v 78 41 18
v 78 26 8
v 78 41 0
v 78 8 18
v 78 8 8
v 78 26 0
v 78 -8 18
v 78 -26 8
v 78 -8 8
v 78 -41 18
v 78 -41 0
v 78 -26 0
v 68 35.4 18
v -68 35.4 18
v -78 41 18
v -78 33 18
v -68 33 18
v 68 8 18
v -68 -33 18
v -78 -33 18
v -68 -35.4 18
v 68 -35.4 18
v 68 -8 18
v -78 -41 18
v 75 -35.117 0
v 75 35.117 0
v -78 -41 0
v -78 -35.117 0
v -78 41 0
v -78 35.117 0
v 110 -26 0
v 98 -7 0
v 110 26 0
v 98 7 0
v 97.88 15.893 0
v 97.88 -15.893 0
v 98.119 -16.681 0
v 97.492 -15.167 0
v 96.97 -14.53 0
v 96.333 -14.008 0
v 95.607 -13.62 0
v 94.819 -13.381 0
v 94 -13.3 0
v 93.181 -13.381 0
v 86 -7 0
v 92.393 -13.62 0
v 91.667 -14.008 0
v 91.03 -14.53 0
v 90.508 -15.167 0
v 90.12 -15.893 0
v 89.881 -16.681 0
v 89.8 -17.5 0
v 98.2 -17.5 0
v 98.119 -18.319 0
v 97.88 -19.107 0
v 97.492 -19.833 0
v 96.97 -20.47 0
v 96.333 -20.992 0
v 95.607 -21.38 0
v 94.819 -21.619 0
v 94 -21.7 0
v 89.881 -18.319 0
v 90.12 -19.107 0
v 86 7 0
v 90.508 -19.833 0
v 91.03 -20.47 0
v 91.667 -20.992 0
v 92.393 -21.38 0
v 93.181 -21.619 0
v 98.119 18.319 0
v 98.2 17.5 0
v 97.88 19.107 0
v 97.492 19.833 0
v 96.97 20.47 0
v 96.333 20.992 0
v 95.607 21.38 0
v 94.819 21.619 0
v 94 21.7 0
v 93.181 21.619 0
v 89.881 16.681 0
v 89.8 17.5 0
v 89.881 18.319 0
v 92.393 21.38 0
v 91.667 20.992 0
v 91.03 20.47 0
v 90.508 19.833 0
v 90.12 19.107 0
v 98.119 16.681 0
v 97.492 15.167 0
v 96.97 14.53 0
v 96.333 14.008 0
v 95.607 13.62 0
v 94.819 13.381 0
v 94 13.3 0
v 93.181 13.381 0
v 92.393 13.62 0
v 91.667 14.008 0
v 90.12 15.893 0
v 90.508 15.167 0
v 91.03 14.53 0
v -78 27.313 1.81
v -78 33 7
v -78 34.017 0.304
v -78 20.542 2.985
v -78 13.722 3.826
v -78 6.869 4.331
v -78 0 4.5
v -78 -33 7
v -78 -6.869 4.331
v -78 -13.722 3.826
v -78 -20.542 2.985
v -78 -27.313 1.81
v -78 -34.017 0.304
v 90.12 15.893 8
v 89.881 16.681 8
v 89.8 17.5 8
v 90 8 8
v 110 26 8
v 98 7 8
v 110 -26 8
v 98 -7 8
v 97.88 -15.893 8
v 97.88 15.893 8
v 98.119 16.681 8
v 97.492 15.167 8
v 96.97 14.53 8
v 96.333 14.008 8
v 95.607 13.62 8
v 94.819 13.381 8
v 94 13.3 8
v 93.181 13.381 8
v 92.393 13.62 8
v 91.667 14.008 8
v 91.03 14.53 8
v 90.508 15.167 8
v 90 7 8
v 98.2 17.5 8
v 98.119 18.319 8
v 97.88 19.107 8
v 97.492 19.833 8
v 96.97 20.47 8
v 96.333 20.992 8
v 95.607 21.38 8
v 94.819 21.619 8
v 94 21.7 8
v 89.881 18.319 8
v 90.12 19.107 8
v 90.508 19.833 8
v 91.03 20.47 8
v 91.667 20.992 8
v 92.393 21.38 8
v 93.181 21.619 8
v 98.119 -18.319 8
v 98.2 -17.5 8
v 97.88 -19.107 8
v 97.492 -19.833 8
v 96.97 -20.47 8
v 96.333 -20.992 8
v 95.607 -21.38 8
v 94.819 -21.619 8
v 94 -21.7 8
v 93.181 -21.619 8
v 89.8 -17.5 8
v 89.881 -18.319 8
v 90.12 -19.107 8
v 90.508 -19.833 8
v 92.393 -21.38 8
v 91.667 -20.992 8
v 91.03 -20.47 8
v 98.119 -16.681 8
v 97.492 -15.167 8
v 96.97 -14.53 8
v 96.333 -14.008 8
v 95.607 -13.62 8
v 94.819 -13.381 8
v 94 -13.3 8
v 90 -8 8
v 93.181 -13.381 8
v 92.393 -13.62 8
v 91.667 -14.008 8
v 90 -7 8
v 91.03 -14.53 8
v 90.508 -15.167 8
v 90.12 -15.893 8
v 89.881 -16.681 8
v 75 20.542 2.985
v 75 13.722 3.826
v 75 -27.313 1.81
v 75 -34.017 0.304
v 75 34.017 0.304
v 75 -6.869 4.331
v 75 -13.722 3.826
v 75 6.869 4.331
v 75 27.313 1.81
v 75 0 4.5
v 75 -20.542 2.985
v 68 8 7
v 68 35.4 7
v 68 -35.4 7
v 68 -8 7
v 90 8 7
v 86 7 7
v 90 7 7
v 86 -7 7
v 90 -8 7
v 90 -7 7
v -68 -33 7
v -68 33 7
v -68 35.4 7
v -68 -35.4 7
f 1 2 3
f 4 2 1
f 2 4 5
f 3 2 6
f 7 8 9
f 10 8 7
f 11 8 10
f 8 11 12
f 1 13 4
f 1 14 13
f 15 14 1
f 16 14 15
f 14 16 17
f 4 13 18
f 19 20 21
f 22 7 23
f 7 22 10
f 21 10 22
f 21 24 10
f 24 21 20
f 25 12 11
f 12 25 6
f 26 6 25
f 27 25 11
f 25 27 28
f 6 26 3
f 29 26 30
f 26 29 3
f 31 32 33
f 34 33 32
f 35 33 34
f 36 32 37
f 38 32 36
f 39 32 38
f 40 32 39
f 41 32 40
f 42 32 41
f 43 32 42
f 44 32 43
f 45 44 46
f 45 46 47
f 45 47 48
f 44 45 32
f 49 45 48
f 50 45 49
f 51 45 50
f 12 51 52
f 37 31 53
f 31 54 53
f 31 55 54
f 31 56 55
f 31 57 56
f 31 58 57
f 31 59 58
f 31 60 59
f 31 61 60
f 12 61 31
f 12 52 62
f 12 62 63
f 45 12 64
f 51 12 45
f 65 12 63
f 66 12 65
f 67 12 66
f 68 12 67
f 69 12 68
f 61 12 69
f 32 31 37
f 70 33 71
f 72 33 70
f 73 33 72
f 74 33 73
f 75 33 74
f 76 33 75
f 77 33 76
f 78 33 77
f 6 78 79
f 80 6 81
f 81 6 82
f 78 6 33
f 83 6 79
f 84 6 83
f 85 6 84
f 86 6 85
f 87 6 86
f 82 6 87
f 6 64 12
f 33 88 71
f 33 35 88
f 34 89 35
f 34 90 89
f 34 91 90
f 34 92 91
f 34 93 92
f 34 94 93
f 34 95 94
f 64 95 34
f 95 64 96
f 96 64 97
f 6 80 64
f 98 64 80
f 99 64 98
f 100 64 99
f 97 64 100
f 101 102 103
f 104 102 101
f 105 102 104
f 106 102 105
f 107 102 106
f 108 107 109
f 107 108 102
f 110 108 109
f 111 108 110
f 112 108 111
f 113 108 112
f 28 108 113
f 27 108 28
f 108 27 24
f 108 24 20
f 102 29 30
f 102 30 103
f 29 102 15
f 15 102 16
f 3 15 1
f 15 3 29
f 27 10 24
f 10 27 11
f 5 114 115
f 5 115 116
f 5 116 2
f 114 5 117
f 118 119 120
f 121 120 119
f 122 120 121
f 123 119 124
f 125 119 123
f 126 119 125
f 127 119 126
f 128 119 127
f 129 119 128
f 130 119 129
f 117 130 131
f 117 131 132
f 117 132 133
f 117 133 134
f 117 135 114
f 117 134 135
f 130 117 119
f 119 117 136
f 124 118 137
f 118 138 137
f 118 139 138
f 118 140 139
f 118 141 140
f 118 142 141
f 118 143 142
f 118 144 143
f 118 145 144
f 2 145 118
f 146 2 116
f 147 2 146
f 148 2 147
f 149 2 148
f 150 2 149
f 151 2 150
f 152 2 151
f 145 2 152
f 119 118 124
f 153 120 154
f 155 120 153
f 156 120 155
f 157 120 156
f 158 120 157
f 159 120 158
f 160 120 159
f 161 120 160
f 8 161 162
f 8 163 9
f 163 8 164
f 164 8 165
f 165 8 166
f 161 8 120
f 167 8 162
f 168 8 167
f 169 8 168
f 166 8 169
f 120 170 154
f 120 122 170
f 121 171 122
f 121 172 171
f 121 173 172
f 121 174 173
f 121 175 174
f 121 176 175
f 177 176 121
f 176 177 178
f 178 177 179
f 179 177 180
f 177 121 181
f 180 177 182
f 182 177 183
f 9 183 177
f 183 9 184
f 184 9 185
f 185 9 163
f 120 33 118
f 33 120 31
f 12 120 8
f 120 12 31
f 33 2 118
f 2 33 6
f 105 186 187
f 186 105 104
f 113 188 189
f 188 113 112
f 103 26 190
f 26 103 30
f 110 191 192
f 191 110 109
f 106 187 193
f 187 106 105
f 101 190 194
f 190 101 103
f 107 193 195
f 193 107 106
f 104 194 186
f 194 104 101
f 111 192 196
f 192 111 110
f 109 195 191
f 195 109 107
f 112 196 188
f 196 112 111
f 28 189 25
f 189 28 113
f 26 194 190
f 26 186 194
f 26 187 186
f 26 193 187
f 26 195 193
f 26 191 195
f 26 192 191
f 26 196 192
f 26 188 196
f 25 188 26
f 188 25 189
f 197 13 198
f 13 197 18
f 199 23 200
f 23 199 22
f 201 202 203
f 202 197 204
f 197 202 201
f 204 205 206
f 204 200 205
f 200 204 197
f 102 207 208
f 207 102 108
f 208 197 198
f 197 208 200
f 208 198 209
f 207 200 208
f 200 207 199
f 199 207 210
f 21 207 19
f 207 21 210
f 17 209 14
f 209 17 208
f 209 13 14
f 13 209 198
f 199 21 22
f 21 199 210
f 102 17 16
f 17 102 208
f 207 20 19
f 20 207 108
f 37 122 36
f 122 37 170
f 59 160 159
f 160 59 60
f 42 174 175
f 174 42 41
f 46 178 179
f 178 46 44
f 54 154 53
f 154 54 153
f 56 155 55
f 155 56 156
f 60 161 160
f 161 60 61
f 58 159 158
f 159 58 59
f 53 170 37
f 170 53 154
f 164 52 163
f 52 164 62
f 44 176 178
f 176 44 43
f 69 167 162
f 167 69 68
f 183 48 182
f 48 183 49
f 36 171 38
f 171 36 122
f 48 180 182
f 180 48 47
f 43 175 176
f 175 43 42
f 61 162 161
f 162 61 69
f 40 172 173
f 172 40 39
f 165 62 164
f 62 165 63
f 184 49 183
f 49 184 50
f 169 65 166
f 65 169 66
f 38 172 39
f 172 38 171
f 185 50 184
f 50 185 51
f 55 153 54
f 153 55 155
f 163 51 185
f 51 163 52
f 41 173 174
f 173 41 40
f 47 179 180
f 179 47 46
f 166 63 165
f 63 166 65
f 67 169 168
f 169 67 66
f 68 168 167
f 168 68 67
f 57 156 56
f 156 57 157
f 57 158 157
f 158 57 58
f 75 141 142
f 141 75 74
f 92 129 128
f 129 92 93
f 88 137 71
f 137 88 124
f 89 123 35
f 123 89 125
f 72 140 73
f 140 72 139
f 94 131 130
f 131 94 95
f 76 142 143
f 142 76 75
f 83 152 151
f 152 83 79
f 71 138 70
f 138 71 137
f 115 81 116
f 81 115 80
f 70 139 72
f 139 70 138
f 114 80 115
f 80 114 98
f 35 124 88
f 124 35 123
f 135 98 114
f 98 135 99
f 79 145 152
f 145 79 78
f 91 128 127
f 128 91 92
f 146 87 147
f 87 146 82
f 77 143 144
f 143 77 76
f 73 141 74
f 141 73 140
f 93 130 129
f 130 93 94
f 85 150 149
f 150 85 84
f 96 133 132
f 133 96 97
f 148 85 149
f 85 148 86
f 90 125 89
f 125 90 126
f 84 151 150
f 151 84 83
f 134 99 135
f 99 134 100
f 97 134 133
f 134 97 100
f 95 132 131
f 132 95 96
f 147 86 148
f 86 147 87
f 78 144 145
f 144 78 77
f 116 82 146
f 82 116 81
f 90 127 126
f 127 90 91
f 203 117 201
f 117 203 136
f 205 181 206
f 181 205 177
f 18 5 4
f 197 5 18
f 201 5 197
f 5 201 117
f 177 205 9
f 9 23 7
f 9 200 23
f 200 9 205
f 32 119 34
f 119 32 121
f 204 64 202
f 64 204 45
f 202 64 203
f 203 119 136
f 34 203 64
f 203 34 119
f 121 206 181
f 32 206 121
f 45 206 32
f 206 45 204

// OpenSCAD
// file: ../../00_common/parameters.scad
// =============================================================================
// OpenMotorBridge - Global CAD Parameters & Settings
// =============================================================================
// File: hardware/cad/scad/00_common/parameters.scad
// Description: Global dimensional constants, manufacturing clearances and
//              circle resolution ($fn) for all OpenSCAD modules.
// =============================================================================

// --- 1. Circle & Curve Resolution ---
$fn = 60; // Smooth cylinders and holes for high-quality MJF 3D printing

// --- 2. Central Main Box Dimensions (3-Tier Sandwich) ---
MAIN_BOX_OUTER_L      = 110.0; // Outer length in X (mm)
MAIN_BOX_OUTER_W      = 74.0;  // Outer width in Y (mm)
MAIN_BOX_LOWER_H      = 17.0;  // Lower case height in Z (mm)
MAIN_BOX_MID_H        = 15.0;  // Mid tray height in Z (mm)
MAIN_BOX_LID_H        = 4.0;   // Lid plate thickness in Z (mm)
MAIN_BOX_WALL         = 2.5;   // Nominal wall thickness (mm)
MAIN_BOX_CORNER_POST  = 7.0;   // Corner clamping screw post size (mm, for M3 hex nut pockets)

// --- 3. Satellite Pod Dimensions (Universal Enlarged Envelope) ---
POD_OUTER_L           = 135.0; // Outer length in X (mm)
POD_OUTER_W           = 70.0;  // Outer width in Y (mm)
POD_OUTER_H           = 38.0;  // Outer height in Z (mm)
POD_WALL              = 3.5;   // Nominal wall thickness (mm)
POD_BULKHEAD_X        = 18.0;  // Partition bulkhead position in X (mm)
POD_CHAMBER_L         = 117.0; // Sliding chamber length in X (mm)
POD_CHAMBER_W         = 63.0;  // Sliding chamber width in Y (mm)
POD_CHAMBER_H         = 31.0;  // Sliding chamber height in Z (mm)

// --- 4. Pod Linear Guide Rails (Poka-Yoke Tongue & Groove) ---
POD_GROOVE_W          = 3.0;   // Internal guide groove width in Z (mm)
POD_GROOVE_DEPTH      = 1.5;   // Internal guide groove depth in Y (mm)
POD_GROOVE_LEFT_Z     = 10.0;  // Center height of left groove (mm)
POD_GROOVE_RIGHT_Z    = 18.0;  // Center height of right groove (mm, asym offset)

CARTRIDGE_TONGUE_W    = 2.6;   // Cartridge tongue rail height in Z (mm, 0.2mm clearance)
CARTRIDGE_TONGUE_PROT = 1.4;   // Cartridge tongue protrusion in Y (mm, 0.1mm clearance)
CARTRIDGE_CHAMFER_L   = 4.0;   // 30° lead-in chamfer nose length (mm)

// --- 5. Cartridge Dimensions (Enlarged Universal Sled) ---
CARTRIDGE_BASE_L      = 116.0; // Sled length in X (mm)
CARTRIDGE_BASE_W      = 58.0;  // Sled width in Y (mm)
CARTRIDGE_BASE_H      = 28.0;  // Sled height in Z (mm)
CARTRIDGE_FACE_L      = 4.0;   // Front faceplate thickness in X (mm)
CARTRIDGE_FACE_W      = 64.0;  // Front faceplate width in Y (mm)
CARTRIDGE_FACE_H      = 34.0;  // Front faceplate height in Z (mm)

// --- 5a. RF Interface & Sealing Dimensions ---
SMA_BORE_R            = 3.25;  // Ø 6.5 mm through-hole for standard SMA bulkhead
SMA_ORECESS_R         = 4.75;  // Ø 9.5 mm recess for waterproof silicone O-ring
SMA_ORECESS_DEPTH     = 1.2;   // 1.2 mm deep O-ring compression pocket

// --- 5b. Magnetic Anti-Theft Lock System ---
LATCH_PIVOT_X         = 58.0;  // Center pivot position along sled X (mm)
LATCH_MAGNET_X        = 46.0;  // Ferromagnetic anchor position along sled X (mm)
LATCH_TOOTH_X         = 70.0;  // Locking sawtooth pawl position along sled X (mm)
LATCH_ARM_H           = 6.0;   // Rocker lever height in Z (mm)
LATCH_ARM_THICK       = 2.6;   // Rocker beam thickness in Y (mm)
LATCH_MAGNET_PIN_DIA  = 6.2;   // Bore for Ø 6.0 mm steel dowel pin (mm)
LATCH_SPRING_DIA      = 3.8;   // Bore for Ø 3.5 mm return compression spring (mm)

// --- 6. Standard Captive Hex Nut Pockets (DIN 934 / DIN 985 with +0.2 mm MJF/FDM clearance) ---
NUT_M2_SW             = 4.2;   // M2 across flats (nominal 4.0 mm)
NUT_M2_H              = 1.8;   // M2 thickness (nominal 1.6 mm)
NUT_M2_5_SW           = 5.2;   // M2.5 across flats (nominal 5.0 mm)
NUT_M2_5_H            = 2.2;   // M2.5 thickness (nominal 2.0 mm)
NUT_M3_SW             = 5.7;   // M3 across flats (nominal 5.5 mm)
NUT_M3_H              = 2.6;   // M3 thickness (nominal 2.4 mm)
NUT_M4_SW             = 7.2;   // M4 across flats (nominal 7.0 mm)
NUT_M4_H              = 3.4;   // M4 thickness (nominal 3.2 mm)
NUT_M5_SW             = 8.2;   // M5 across flats (nominal 8.0 mm)
NUT_M5_H              = 4.2;   // M5 thickness (nominal 4.0 mm)

// Direct Plastic Thread-Forming / Self-Tapping Pilot Holes in PA12 (100% Soldering-Iron Free)
M2_PILOT_HOLE_R       = 0.85;  // Core hole for M2 screws in PA12 (Ø 1.7 mm)
M2_5_PILOT_HOLE_R     = 1.05;  // Core hole for M2.5 screws in PA12 (Ø 2.1 mm)
M3_PILOT_HOLE_R       = 1.25;  // Core hole for M3 screws in PA12 (Ø 2.5 mm)

// --- 7. Screw & Clearance Dimensions ---
M2_SCREW_HOLE_R       = 1.1;   // M2 clearance hole (r = 1.1 mm -> Ø 2.2 mm)
M2_5_SCREW_HOLE_R     = 1.4;   // M2.5 clearance hole (r = 1.4 mm -> Ø 2.8 mm)
M3_SCREW_HOLE_R       = 1.65;  // M3 clearance hole (r = 1.65 mm -> Ø 3.3 mm)
M4_SCREW_HOLE_R       = 2.2;   // M4 clearance hole (r = 2.2 mm -> Ø 4.4 mm)
M8_BORE_R             = 4.0;   // M8 cable through-bore (r = 4.0 mm -> Ø 8.0 mm)
M8_STUDS_OUTER_R      = 6.0;   // M8 neck outer radius (Ø 12.0 mm)

// --- 8. Universal Front Node Enclosure Dimensions (Type E: 98 x 68 x 25 mm) ---
FRONT_NODE_PCB_L      = 82.0;  // PCB length in X (mm, PCBA 05)
FRONT_NODE_PCB_W      = 50.0;  // PCB width in Y (mm, PCBA 05)
FRONT_NODE_PCB_H      = 1.6;   // PCB thickness in Z (mm)
FRONT_NODE_PCB_R      = 2.5;   // PCB corner radius (mm)

FRONT_NODE_CHAMBER_L  = 86.0;  // Internal chamber length in X (mm, 2mm margin per side)
FRONT_NODE_CHAMBER_W  = 56.0;  // Internal chamber width in Y (mm, 3mm margin per side)
FRONT_NODE_TUB_H      = 17.5;  // Lower tub depth in Z (mm)
FRONT_NODE_LID_H      = 7.5;   // Upper lid height in Z (mm)
FRONT_NODE_WALL       = 2.5;   // Wall thickness in HP MJF PA12 (mm)
FRONT_NODE_CORNER_R   = 4.0;   // Outer enclosure corner radius (mm)

FRONT_NODE_OUTER_L    = FRONT_NODE_CHAMBER_L + 2 * FRONT_NODE_WALL + 7.0; // 98.0 mm
FRONT_NODE_OUTER_W    = FRONT_NODE_CHAMBER_W + 2 * FRONT_NODE_WALL + 7.0; // 68.0 mm
FRONT_NODE_OUTER_H    = FRONT_NODE_TUB_H + FRONT_NODE_LID_H;              // 25.0 mm

// PCB Standoff Heights & Radii (100% Soldering-Iron Free)
FRONT_NODE_STANDOFF_H = 3.0;   // Height of PCB standoffs from floor (mm)
FRONT_NODE_STANDOFF_R = 3.0;   // Outer radius of M2.5 screw bosses (mm)
FRONT_NODE_CORE_HOLE_R= M2_5_PILOT_HOLE_R; // Core hole for direct M2.5 screw engagement (Ø 2.1 mm)

// AMPS 4-Hole Mounting Pattern (38 x 30 mm with DIN 934 M4 Captive Nut Pockets)
AMPS_SPACING_X        = 38.0;  // AMPS hole distance in X (mm)
AMPS_SPACING_Y        = 30.0;  // AMPS hole distance in Y (mm)
AMPS_NUT_SW           = NUT_M4_SW; // Captive M4 hex nut pocket across flats (7.2 mm)
AMPS_NUT_H            = NUT_M4_H;  // Captive M4 hex nut pocket depth (3.4 mm)

// Acoustic Vent for Knowles SPH0645 MEMS
FRONT_NODE_MIC_HOLE_R = 1.25;  // Sound canal radius (Ø 2.5 mm)
FRONT_NODE_MIC_MEMB_R = 3.0;   // Gore ePTFE membrane pocket radius (Ø 6.0 mm)
FRONT_NODE_MIC_MEMB_D = 0.8;   // Membrane pocket depth (mm)
// main file
// =============================================================================
// OpenMotorBridge - Satellite Pod: Curved Fender Saddle Cradle (Harley-Davidson)
// =============================================================================
// File: hardware/cad/scad/02_pod_base/parts/006_fender_curved_saddle.scad
// Description: Parametric curved cradle foot matched to the cylindrical curvature
//              of Harley-Davidson Touring rear fenders (R ≈ 140 mm crown / R ≈ 320 mm arch).
//              Key Architecture:
//              1. 100% NON-INVASIVE MOUNTING: Zero holes drilled into the painted fender!
//                 Anchors rigidly via an integrated rear mounting tongue directly to the
//                 existing OEM Blinkerbrücke / turn signal bar studs (5/16"-18 / M8, 35mm spacing).
//              2. Compound concave cylindrical bottom arch hugging the fender profile.
//              3. 1.5 mm deep recessed pocket for vibration-damping EPDM contour pad.
//              4. Recessed nest holding the universal Pod 3 base housing (Typ B, 135 x 70 x 38 mm).
//              5. Open front aperture for tool-free cartridge slide-out towards the seat.
//              6. Concealed underfloor cable duct diving behind Blinkerbrücke into fender grommet.
// =============================================================================

include <../../00_common/parameters.scad>;

FENDER_R_TRANS    = 140.0; // Harley-Davidson Touring transverse crown radius (mm)
FENDER_R_LONG     = 320.0; // Harley-Davidson Touring longitudinal wheel radius (mm)
FENDER_PAD_THICK  = 1.5;   // EPDM vibration damping layer thickness (mm)

module fender_curved_saddle(
    base_l = 156.0,
    base_w = 82.0,
    base_h = 18.0
) {
    difference() {
        union() {
            // 1. Solid Cradle Base Block with side skirts
            translate([-base_l/2.0, -base_w/2.0, 0.0])
                cube([base_l, base_w, base_h], center=false);

            // 2. Integrated Rear Mounting Tongue (reaching OEM Blinkerbrücke studs)
            // ZERO holes in the fender! Clamps directly to factory light bar studs.
            translate([base_l/2.0 - 4.0, -26.0, 0.0])
                hull() {
                    cube([36.0, 52.0, 8.0], center=false);
                    translate([34.0, 5.0, 0])
                        cube([2.0, 42.0, 6.0], center=false);
                }
        }

        // --- SUBTRACTIONS ---

        // A. True Cylindrical Concave Fender Arch (Transverse R=140 mm)
        // Stops before reaching the rear mounting tongue
        translate([0, 0, -FENDER_R_TRANS + 4.5])
            intersection() {
                rotate([0, 90, 0])
                    cylinder(r=FENDER_R_TRANS, h=base_l + 20.0, center=true, $fn=128);
                translate([-base_l/2.0 - 5.0, -base_w, -10.0])
                    cube([base_l + 2.0, base_w * 2.0, FENDER_R_TRANS + 20.0], center=false);
            }

        // B. Recessed Nest for Universal Pod 3 Base Housing (135 x 70 x 38 mm)
        // Starts at Z = 7.0 mm (leaving 2.5 mm solid floor above fender arch)
        translate([-POD_OUTER_L/2.0 - 0.5, -POD_OUTER_W/2.0 - 0.4, 7.0])
            cube([POD_OUTER_L + 1.0, POD_OUTER_W + 0.8, 20.0], center=false);

        // C. Front Service Aperture (allowing cartridge to slide out forward)
        translate([-base_l/2.0 - 5.0, -CARTRIDGE_FACE_W/2.0 - 1.0, 7.0])
            cube([18.0, CARTRIDGE_FACE_W + 2.0, 20.0], center=false);

        // D. Dual OEM Blinkerbrücke mounting bores (35 mm spacing, Ø 8.4 mm for 5/16"-18 / M8)
        translate([base_l/2.0 + 16.0, -17.5, -2.0])
            cylinder(r=4.2, h=14.0, center=false, $fn=32);
        translate([base_l/2.0 + 16.0, 17.5, -2.0])
            cylinder(r=4.2, h=14.0, center=false, $fn=32);

        // E. Concealed Rear Cable Duct
        translate([POD_OUTER_L/2.0 - 4.0, -8.0, 7.0])
            cube([base_l/2.0 - POD_OUTER_L/2.0 + 16.0, 16.0, 14.0], center=false);
        // Vertical cable drop behind Blinkerbrücke into OEM grommet
        translate([base_l/2.0 + 8.0, -7.0, -4.0])
            cube([12.0, 14.0, 16.0], center=false);
    }
}

// Standalone render / STL export
fender_curved_saddle();
